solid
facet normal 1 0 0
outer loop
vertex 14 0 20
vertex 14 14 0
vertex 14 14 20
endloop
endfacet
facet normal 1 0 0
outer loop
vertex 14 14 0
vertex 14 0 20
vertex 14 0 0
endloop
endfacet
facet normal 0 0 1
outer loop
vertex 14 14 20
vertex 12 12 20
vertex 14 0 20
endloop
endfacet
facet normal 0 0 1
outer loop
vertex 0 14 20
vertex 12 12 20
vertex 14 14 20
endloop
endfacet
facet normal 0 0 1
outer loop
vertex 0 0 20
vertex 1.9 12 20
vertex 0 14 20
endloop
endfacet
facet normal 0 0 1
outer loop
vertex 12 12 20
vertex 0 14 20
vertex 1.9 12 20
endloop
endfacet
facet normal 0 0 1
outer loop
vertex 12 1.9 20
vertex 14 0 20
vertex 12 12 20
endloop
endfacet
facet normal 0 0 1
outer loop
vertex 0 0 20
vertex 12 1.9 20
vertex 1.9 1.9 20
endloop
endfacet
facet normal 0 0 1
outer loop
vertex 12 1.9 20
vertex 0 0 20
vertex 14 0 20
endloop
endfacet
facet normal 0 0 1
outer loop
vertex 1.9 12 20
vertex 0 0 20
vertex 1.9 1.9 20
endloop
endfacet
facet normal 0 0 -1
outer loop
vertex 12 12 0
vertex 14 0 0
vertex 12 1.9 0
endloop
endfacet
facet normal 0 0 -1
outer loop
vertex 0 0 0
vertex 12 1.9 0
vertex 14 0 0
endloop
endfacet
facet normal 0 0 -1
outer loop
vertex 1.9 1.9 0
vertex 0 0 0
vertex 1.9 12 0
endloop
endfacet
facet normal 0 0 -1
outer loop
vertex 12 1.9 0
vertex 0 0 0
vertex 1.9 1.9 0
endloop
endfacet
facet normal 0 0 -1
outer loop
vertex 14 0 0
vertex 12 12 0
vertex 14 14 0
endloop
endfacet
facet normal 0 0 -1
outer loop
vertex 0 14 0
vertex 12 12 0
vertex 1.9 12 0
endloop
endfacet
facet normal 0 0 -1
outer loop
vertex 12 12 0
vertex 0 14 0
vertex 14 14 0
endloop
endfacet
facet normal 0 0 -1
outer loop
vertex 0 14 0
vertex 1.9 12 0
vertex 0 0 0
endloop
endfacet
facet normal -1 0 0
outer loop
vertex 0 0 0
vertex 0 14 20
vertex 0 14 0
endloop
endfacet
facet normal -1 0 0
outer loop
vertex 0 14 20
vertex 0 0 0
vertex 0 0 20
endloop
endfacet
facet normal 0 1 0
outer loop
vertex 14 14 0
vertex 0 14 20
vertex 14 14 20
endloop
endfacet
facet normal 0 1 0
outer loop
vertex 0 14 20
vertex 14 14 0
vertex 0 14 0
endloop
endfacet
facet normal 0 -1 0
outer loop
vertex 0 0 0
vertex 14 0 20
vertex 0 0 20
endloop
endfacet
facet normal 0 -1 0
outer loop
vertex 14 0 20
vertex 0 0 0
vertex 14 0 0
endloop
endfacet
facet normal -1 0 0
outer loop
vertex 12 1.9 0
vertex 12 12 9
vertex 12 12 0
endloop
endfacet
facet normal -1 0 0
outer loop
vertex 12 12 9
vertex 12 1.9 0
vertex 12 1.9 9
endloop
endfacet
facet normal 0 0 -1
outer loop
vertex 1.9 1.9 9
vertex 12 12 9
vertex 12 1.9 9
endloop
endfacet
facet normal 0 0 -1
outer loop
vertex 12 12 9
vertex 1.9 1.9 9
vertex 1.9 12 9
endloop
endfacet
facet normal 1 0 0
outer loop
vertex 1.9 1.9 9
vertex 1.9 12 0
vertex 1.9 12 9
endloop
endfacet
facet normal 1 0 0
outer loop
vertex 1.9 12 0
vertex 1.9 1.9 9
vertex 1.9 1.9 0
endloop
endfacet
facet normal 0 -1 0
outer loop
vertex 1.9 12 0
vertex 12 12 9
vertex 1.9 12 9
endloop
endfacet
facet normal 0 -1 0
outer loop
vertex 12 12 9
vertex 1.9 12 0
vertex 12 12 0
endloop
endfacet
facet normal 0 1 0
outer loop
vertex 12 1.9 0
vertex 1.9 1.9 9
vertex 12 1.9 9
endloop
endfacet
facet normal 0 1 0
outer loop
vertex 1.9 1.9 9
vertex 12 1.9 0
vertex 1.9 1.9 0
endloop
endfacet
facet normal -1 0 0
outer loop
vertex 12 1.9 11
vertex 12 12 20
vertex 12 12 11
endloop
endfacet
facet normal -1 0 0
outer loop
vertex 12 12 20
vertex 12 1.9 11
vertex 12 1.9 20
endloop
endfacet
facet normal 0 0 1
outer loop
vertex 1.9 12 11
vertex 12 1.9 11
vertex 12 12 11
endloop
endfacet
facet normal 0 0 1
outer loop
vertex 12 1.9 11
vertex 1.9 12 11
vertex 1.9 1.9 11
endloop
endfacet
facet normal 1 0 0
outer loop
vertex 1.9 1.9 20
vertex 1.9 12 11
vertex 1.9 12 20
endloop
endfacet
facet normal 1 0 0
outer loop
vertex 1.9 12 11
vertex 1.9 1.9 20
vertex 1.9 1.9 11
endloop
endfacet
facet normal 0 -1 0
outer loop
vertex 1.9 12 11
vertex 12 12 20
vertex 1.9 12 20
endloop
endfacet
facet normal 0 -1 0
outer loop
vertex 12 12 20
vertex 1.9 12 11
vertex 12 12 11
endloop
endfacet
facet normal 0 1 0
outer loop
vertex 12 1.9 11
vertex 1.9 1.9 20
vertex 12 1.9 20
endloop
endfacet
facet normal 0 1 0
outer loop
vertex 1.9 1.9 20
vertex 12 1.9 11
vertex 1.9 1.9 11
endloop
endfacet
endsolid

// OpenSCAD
difference()
{
  cube([14,14,20]);
  translate([1.9,1.9,-1]) cube([10.1,10.1,10]);
  translate([1.9,1.9,11]) cube([10.1,10.1,10]);
}
